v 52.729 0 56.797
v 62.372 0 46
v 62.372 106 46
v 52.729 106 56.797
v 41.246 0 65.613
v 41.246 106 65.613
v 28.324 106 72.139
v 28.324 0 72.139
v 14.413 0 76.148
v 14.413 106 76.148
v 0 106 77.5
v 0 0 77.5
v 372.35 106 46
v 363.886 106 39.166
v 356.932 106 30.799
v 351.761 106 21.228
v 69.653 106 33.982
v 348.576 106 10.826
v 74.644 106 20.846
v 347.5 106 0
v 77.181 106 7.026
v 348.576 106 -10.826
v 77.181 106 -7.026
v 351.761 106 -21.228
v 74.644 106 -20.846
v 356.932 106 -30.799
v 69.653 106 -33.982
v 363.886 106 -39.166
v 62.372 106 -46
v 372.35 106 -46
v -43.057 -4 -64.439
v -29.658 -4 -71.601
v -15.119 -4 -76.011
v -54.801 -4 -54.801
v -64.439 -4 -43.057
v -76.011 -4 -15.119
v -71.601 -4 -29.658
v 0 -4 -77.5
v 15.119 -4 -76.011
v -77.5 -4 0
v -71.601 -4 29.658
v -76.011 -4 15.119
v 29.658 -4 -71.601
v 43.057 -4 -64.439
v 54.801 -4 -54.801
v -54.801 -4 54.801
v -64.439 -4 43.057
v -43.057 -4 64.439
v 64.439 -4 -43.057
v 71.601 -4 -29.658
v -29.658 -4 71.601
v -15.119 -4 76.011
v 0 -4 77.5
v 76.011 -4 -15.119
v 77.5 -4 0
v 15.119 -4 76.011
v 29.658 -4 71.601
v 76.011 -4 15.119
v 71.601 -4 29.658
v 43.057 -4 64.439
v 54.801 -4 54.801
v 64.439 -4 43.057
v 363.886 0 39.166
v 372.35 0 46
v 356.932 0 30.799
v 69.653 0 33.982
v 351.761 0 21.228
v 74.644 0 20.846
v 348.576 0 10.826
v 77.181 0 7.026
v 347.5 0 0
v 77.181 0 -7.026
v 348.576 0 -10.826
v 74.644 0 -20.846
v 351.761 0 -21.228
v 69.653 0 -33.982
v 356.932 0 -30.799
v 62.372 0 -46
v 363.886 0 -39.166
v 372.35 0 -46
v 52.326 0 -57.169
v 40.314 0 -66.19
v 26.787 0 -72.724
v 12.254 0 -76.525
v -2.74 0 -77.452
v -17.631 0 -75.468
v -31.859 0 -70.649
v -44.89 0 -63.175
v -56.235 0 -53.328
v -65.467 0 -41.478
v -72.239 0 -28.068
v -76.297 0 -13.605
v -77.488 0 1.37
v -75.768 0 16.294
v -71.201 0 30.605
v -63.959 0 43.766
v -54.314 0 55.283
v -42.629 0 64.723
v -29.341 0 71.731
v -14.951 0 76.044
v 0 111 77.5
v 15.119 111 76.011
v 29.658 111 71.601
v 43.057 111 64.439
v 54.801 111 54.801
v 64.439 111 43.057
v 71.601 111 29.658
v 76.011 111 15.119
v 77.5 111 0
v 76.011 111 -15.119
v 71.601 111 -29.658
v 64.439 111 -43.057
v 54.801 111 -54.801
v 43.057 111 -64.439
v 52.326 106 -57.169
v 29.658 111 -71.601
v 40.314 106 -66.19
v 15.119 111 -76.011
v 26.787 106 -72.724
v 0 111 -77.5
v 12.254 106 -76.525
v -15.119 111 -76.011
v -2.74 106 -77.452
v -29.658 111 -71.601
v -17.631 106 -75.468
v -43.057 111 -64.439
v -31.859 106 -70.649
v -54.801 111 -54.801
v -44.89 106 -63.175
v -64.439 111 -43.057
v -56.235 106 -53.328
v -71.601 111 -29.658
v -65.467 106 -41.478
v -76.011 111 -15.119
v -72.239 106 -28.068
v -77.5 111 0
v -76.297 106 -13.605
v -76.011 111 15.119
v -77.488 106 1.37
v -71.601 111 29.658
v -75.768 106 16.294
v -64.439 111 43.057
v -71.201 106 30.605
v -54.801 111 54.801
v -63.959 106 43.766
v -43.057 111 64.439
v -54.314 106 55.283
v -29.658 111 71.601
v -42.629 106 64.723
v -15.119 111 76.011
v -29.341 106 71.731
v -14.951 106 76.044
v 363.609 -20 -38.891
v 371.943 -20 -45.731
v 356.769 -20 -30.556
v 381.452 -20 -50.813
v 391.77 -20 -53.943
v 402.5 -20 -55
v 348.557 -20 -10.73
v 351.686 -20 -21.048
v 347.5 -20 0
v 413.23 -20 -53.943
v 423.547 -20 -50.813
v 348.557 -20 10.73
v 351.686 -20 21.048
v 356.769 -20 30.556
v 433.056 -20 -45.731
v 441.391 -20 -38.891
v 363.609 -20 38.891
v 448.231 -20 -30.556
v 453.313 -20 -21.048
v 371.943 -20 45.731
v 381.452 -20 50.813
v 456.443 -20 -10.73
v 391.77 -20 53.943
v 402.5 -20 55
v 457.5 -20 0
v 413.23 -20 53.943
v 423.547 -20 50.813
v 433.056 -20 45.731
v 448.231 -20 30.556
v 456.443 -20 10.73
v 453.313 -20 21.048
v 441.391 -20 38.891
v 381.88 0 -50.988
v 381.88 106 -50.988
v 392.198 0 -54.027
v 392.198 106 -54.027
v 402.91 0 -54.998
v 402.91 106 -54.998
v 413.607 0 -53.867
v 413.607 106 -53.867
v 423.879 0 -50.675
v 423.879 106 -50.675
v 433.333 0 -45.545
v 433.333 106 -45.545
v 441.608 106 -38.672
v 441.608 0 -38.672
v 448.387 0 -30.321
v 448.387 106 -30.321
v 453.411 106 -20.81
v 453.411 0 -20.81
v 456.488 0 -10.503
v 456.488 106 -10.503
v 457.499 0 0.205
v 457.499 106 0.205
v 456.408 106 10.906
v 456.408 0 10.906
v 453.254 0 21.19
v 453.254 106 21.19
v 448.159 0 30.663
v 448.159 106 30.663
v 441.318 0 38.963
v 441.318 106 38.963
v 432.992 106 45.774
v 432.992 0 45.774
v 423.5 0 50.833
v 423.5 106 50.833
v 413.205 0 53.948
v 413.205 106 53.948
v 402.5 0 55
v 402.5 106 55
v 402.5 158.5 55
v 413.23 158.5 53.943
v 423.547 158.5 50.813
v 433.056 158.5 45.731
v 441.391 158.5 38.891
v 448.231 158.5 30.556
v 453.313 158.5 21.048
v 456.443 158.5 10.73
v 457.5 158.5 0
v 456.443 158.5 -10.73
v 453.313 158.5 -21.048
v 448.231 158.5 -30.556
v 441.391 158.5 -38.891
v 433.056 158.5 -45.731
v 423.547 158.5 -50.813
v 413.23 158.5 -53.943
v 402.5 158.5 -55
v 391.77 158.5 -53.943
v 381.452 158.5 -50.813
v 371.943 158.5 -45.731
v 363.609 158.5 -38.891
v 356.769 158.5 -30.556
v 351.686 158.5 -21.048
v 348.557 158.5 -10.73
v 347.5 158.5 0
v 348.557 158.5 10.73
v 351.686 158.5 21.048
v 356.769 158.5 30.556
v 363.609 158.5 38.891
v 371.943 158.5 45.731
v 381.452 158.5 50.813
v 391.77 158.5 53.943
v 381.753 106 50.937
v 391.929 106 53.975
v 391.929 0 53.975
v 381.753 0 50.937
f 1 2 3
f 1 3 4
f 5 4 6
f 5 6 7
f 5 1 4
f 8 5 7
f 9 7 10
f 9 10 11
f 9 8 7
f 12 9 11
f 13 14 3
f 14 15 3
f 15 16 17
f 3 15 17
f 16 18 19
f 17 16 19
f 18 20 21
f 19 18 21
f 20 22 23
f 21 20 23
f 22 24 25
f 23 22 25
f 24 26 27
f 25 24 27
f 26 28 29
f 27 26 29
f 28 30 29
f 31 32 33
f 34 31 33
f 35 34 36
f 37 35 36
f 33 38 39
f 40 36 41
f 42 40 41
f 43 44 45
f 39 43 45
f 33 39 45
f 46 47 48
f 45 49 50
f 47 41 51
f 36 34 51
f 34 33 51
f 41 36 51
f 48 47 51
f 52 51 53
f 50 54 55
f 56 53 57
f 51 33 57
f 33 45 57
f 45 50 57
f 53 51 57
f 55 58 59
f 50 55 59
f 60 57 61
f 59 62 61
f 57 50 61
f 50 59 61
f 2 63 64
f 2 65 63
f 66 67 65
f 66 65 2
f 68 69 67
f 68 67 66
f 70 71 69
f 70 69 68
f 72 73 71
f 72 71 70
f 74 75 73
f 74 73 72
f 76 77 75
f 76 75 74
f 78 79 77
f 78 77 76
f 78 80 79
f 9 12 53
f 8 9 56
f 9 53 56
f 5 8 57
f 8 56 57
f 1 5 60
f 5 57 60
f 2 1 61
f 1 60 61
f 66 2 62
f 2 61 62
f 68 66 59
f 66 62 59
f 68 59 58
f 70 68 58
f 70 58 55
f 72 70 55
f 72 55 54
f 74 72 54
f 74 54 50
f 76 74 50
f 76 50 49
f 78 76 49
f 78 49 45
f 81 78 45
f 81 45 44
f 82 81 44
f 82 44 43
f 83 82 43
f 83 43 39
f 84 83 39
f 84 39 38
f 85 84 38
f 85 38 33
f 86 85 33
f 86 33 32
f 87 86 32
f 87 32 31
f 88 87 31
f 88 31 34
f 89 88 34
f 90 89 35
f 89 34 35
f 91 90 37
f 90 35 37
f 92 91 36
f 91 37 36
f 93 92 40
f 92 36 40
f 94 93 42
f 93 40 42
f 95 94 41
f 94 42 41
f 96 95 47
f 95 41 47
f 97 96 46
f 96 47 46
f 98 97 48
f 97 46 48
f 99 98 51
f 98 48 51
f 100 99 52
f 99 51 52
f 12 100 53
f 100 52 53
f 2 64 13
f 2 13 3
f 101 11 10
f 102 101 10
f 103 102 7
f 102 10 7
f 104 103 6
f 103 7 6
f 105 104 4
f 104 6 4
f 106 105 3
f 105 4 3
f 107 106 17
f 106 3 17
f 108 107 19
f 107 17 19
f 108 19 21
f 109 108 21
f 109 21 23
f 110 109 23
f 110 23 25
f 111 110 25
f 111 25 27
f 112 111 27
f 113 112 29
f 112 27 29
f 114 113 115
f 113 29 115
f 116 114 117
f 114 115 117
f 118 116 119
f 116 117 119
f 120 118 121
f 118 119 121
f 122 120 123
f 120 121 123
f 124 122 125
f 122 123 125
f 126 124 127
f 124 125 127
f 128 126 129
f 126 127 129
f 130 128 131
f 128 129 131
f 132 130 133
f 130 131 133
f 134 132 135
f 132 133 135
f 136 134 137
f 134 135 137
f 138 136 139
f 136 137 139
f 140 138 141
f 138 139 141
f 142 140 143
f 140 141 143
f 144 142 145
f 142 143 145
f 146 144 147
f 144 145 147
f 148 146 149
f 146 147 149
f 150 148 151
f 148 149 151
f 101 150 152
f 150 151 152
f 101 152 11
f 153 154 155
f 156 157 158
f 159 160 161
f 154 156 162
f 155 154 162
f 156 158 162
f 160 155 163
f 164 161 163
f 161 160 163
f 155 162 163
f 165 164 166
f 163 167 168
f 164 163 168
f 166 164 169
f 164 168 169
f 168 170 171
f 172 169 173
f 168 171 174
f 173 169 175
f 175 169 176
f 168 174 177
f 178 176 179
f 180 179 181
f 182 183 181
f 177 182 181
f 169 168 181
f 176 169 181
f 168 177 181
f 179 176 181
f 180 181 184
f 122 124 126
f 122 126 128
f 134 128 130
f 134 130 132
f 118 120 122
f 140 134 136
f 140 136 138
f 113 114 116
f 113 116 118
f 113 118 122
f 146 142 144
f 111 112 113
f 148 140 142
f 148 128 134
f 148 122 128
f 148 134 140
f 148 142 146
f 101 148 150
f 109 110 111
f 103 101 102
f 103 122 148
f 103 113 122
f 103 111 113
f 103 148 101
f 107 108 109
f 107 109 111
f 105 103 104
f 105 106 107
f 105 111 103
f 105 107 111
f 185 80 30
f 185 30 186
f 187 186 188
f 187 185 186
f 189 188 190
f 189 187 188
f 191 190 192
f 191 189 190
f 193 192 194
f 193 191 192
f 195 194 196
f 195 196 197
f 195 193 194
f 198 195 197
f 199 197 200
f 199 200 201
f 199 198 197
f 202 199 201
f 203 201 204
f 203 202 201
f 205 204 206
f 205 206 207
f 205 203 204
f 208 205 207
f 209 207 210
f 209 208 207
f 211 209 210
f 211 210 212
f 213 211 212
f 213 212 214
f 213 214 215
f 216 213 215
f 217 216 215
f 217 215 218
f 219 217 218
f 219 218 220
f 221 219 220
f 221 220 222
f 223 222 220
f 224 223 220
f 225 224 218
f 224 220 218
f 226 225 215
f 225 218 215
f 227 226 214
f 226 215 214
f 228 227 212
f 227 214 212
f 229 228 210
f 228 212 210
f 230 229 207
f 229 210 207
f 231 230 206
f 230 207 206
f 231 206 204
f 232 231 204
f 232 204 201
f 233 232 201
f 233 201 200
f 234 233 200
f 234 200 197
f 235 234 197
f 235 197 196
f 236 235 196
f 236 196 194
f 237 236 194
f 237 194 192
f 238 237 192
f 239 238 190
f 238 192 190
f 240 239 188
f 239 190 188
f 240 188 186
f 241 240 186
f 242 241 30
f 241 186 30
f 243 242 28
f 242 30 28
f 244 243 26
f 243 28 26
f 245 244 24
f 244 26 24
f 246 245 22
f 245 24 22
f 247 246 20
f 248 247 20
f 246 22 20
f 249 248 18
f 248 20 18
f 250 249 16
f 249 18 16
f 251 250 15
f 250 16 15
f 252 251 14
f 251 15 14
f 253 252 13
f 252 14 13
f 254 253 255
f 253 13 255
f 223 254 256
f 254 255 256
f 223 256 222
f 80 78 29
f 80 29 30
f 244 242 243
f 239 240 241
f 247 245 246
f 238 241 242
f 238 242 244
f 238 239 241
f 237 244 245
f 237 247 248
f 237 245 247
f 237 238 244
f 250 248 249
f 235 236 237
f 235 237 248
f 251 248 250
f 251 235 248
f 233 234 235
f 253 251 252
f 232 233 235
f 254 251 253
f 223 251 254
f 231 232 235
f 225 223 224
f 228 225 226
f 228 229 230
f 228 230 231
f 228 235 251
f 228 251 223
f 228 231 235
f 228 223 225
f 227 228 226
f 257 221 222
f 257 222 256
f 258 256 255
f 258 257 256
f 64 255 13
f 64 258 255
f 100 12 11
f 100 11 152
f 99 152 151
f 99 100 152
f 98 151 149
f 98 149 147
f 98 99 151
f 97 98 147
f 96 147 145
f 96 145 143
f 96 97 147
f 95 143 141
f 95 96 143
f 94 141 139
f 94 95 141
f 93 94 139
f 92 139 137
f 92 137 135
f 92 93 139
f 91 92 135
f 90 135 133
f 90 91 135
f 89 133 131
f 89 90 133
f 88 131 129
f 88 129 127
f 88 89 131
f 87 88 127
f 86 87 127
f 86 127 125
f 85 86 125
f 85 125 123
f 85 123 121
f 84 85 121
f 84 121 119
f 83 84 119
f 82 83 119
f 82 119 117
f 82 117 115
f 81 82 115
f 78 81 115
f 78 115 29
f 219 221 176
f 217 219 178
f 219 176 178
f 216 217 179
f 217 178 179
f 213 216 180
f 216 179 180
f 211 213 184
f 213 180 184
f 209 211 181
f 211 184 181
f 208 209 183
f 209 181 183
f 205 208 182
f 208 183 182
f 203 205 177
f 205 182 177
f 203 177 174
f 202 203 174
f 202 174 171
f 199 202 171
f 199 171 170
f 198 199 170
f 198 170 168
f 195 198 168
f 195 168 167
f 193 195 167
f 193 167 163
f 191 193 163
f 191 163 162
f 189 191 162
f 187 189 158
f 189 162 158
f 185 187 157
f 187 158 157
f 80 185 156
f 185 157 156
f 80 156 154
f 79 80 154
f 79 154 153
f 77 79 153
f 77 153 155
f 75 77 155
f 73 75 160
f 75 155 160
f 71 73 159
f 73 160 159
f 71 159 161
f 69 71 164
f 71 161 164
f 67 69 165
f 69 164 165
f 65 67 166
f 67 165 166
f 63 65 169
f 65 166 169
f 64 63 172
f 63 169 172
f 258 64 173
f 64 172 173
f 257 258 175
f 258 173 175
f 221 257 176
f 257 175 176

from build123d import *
from build123d.topology import SkipClean

# Parameters (mm, degrees)
SALIENTE_EXTRUIR1_DEPTH      = 106
SALIENTE_EXTRUIR2_DEPTH      = 5
SALIENTE_EXTRUIR2_DEPTH_BACK = 110
CROQUIS2_R                   = 77.5
SALIENTE_EXTRUIR3_DEPTH      = 52.5
SALIENTE_EXTRUIR3_DEPTH_BACK = 126
CROQUIS3_R                   = 55


with BuildPart() as part:
    # Croquis1 → Saliente-Extruir1 (new body)
    with BuildSketch(Plane(origin=(0, 0, 0), x_dir=(1, 0, 0), z_dir=(0, 1, 0))):
        with BuildLine():
            Line((62.371868659, 46), (372.350129794, 46))
            ThreePointArc((372.350129794, 46), (457.499756657, 0), (372.350129794, -46))
            Line((372.350129794, -46), (62.371868659, -46))
            ThreePointArc((62.371868659, -46), (-77.5, 0), (62.371868659, 46))
        make_face()
    extrude(amount=SALIENTE_EXTRUIR1_DEPTH)

    # Croquis2 → Saliente-Extruir2 (add, two sides: drawn at the far end of the back side and taken through both)
    with SkipClean():  # the faces are left unmerged after this step: merging them gives an invalid solid
        with BuildSketch(Plane(origin=(0, 106, 0), x_dir=(1, 0, 0), z_dir=(0, 1, 0)).offset(-SALIENTE_EXTRUIR2_DEPTH_BACK)):
            Circle(CROQUIS2_R)
        extrude(amount=SALIENTE_EXTRUIR2_DEPTH + SALIENTE_EXTRUIR2_DEPTH_BACK)
    add(part.part.scale(1), mode=Mode.REPLACE)  # the faces are merged on a copy

    # Croquis3 → Saliente-Extruir3 (add, two sides: drawn at the far end of the back side and taken through both)
    with SkipClean():  # the faces are left unmerged after this step: merging them gives an invalid solid
        with BuildSketch(Plane(origin=(0, 106, 0), x_dir=(1, 0, 0), z_dir=(0, 1, 0)).offset(-SALIENTE_EXTRUIR3_DEPTH_BACK)):
            with Locations((402.499756657, 0)):
                Circle(CROQUIS3_R)
        extrude(amount=SALIENTE_EXTRUIR3_DEPTH + SALIENTE_EXTRUIR3_DEPTH_BACK)
    add(part.part.scale(1), mode=Mode.REPLACE)  # the faces are merged on a copy


solid = part.part
